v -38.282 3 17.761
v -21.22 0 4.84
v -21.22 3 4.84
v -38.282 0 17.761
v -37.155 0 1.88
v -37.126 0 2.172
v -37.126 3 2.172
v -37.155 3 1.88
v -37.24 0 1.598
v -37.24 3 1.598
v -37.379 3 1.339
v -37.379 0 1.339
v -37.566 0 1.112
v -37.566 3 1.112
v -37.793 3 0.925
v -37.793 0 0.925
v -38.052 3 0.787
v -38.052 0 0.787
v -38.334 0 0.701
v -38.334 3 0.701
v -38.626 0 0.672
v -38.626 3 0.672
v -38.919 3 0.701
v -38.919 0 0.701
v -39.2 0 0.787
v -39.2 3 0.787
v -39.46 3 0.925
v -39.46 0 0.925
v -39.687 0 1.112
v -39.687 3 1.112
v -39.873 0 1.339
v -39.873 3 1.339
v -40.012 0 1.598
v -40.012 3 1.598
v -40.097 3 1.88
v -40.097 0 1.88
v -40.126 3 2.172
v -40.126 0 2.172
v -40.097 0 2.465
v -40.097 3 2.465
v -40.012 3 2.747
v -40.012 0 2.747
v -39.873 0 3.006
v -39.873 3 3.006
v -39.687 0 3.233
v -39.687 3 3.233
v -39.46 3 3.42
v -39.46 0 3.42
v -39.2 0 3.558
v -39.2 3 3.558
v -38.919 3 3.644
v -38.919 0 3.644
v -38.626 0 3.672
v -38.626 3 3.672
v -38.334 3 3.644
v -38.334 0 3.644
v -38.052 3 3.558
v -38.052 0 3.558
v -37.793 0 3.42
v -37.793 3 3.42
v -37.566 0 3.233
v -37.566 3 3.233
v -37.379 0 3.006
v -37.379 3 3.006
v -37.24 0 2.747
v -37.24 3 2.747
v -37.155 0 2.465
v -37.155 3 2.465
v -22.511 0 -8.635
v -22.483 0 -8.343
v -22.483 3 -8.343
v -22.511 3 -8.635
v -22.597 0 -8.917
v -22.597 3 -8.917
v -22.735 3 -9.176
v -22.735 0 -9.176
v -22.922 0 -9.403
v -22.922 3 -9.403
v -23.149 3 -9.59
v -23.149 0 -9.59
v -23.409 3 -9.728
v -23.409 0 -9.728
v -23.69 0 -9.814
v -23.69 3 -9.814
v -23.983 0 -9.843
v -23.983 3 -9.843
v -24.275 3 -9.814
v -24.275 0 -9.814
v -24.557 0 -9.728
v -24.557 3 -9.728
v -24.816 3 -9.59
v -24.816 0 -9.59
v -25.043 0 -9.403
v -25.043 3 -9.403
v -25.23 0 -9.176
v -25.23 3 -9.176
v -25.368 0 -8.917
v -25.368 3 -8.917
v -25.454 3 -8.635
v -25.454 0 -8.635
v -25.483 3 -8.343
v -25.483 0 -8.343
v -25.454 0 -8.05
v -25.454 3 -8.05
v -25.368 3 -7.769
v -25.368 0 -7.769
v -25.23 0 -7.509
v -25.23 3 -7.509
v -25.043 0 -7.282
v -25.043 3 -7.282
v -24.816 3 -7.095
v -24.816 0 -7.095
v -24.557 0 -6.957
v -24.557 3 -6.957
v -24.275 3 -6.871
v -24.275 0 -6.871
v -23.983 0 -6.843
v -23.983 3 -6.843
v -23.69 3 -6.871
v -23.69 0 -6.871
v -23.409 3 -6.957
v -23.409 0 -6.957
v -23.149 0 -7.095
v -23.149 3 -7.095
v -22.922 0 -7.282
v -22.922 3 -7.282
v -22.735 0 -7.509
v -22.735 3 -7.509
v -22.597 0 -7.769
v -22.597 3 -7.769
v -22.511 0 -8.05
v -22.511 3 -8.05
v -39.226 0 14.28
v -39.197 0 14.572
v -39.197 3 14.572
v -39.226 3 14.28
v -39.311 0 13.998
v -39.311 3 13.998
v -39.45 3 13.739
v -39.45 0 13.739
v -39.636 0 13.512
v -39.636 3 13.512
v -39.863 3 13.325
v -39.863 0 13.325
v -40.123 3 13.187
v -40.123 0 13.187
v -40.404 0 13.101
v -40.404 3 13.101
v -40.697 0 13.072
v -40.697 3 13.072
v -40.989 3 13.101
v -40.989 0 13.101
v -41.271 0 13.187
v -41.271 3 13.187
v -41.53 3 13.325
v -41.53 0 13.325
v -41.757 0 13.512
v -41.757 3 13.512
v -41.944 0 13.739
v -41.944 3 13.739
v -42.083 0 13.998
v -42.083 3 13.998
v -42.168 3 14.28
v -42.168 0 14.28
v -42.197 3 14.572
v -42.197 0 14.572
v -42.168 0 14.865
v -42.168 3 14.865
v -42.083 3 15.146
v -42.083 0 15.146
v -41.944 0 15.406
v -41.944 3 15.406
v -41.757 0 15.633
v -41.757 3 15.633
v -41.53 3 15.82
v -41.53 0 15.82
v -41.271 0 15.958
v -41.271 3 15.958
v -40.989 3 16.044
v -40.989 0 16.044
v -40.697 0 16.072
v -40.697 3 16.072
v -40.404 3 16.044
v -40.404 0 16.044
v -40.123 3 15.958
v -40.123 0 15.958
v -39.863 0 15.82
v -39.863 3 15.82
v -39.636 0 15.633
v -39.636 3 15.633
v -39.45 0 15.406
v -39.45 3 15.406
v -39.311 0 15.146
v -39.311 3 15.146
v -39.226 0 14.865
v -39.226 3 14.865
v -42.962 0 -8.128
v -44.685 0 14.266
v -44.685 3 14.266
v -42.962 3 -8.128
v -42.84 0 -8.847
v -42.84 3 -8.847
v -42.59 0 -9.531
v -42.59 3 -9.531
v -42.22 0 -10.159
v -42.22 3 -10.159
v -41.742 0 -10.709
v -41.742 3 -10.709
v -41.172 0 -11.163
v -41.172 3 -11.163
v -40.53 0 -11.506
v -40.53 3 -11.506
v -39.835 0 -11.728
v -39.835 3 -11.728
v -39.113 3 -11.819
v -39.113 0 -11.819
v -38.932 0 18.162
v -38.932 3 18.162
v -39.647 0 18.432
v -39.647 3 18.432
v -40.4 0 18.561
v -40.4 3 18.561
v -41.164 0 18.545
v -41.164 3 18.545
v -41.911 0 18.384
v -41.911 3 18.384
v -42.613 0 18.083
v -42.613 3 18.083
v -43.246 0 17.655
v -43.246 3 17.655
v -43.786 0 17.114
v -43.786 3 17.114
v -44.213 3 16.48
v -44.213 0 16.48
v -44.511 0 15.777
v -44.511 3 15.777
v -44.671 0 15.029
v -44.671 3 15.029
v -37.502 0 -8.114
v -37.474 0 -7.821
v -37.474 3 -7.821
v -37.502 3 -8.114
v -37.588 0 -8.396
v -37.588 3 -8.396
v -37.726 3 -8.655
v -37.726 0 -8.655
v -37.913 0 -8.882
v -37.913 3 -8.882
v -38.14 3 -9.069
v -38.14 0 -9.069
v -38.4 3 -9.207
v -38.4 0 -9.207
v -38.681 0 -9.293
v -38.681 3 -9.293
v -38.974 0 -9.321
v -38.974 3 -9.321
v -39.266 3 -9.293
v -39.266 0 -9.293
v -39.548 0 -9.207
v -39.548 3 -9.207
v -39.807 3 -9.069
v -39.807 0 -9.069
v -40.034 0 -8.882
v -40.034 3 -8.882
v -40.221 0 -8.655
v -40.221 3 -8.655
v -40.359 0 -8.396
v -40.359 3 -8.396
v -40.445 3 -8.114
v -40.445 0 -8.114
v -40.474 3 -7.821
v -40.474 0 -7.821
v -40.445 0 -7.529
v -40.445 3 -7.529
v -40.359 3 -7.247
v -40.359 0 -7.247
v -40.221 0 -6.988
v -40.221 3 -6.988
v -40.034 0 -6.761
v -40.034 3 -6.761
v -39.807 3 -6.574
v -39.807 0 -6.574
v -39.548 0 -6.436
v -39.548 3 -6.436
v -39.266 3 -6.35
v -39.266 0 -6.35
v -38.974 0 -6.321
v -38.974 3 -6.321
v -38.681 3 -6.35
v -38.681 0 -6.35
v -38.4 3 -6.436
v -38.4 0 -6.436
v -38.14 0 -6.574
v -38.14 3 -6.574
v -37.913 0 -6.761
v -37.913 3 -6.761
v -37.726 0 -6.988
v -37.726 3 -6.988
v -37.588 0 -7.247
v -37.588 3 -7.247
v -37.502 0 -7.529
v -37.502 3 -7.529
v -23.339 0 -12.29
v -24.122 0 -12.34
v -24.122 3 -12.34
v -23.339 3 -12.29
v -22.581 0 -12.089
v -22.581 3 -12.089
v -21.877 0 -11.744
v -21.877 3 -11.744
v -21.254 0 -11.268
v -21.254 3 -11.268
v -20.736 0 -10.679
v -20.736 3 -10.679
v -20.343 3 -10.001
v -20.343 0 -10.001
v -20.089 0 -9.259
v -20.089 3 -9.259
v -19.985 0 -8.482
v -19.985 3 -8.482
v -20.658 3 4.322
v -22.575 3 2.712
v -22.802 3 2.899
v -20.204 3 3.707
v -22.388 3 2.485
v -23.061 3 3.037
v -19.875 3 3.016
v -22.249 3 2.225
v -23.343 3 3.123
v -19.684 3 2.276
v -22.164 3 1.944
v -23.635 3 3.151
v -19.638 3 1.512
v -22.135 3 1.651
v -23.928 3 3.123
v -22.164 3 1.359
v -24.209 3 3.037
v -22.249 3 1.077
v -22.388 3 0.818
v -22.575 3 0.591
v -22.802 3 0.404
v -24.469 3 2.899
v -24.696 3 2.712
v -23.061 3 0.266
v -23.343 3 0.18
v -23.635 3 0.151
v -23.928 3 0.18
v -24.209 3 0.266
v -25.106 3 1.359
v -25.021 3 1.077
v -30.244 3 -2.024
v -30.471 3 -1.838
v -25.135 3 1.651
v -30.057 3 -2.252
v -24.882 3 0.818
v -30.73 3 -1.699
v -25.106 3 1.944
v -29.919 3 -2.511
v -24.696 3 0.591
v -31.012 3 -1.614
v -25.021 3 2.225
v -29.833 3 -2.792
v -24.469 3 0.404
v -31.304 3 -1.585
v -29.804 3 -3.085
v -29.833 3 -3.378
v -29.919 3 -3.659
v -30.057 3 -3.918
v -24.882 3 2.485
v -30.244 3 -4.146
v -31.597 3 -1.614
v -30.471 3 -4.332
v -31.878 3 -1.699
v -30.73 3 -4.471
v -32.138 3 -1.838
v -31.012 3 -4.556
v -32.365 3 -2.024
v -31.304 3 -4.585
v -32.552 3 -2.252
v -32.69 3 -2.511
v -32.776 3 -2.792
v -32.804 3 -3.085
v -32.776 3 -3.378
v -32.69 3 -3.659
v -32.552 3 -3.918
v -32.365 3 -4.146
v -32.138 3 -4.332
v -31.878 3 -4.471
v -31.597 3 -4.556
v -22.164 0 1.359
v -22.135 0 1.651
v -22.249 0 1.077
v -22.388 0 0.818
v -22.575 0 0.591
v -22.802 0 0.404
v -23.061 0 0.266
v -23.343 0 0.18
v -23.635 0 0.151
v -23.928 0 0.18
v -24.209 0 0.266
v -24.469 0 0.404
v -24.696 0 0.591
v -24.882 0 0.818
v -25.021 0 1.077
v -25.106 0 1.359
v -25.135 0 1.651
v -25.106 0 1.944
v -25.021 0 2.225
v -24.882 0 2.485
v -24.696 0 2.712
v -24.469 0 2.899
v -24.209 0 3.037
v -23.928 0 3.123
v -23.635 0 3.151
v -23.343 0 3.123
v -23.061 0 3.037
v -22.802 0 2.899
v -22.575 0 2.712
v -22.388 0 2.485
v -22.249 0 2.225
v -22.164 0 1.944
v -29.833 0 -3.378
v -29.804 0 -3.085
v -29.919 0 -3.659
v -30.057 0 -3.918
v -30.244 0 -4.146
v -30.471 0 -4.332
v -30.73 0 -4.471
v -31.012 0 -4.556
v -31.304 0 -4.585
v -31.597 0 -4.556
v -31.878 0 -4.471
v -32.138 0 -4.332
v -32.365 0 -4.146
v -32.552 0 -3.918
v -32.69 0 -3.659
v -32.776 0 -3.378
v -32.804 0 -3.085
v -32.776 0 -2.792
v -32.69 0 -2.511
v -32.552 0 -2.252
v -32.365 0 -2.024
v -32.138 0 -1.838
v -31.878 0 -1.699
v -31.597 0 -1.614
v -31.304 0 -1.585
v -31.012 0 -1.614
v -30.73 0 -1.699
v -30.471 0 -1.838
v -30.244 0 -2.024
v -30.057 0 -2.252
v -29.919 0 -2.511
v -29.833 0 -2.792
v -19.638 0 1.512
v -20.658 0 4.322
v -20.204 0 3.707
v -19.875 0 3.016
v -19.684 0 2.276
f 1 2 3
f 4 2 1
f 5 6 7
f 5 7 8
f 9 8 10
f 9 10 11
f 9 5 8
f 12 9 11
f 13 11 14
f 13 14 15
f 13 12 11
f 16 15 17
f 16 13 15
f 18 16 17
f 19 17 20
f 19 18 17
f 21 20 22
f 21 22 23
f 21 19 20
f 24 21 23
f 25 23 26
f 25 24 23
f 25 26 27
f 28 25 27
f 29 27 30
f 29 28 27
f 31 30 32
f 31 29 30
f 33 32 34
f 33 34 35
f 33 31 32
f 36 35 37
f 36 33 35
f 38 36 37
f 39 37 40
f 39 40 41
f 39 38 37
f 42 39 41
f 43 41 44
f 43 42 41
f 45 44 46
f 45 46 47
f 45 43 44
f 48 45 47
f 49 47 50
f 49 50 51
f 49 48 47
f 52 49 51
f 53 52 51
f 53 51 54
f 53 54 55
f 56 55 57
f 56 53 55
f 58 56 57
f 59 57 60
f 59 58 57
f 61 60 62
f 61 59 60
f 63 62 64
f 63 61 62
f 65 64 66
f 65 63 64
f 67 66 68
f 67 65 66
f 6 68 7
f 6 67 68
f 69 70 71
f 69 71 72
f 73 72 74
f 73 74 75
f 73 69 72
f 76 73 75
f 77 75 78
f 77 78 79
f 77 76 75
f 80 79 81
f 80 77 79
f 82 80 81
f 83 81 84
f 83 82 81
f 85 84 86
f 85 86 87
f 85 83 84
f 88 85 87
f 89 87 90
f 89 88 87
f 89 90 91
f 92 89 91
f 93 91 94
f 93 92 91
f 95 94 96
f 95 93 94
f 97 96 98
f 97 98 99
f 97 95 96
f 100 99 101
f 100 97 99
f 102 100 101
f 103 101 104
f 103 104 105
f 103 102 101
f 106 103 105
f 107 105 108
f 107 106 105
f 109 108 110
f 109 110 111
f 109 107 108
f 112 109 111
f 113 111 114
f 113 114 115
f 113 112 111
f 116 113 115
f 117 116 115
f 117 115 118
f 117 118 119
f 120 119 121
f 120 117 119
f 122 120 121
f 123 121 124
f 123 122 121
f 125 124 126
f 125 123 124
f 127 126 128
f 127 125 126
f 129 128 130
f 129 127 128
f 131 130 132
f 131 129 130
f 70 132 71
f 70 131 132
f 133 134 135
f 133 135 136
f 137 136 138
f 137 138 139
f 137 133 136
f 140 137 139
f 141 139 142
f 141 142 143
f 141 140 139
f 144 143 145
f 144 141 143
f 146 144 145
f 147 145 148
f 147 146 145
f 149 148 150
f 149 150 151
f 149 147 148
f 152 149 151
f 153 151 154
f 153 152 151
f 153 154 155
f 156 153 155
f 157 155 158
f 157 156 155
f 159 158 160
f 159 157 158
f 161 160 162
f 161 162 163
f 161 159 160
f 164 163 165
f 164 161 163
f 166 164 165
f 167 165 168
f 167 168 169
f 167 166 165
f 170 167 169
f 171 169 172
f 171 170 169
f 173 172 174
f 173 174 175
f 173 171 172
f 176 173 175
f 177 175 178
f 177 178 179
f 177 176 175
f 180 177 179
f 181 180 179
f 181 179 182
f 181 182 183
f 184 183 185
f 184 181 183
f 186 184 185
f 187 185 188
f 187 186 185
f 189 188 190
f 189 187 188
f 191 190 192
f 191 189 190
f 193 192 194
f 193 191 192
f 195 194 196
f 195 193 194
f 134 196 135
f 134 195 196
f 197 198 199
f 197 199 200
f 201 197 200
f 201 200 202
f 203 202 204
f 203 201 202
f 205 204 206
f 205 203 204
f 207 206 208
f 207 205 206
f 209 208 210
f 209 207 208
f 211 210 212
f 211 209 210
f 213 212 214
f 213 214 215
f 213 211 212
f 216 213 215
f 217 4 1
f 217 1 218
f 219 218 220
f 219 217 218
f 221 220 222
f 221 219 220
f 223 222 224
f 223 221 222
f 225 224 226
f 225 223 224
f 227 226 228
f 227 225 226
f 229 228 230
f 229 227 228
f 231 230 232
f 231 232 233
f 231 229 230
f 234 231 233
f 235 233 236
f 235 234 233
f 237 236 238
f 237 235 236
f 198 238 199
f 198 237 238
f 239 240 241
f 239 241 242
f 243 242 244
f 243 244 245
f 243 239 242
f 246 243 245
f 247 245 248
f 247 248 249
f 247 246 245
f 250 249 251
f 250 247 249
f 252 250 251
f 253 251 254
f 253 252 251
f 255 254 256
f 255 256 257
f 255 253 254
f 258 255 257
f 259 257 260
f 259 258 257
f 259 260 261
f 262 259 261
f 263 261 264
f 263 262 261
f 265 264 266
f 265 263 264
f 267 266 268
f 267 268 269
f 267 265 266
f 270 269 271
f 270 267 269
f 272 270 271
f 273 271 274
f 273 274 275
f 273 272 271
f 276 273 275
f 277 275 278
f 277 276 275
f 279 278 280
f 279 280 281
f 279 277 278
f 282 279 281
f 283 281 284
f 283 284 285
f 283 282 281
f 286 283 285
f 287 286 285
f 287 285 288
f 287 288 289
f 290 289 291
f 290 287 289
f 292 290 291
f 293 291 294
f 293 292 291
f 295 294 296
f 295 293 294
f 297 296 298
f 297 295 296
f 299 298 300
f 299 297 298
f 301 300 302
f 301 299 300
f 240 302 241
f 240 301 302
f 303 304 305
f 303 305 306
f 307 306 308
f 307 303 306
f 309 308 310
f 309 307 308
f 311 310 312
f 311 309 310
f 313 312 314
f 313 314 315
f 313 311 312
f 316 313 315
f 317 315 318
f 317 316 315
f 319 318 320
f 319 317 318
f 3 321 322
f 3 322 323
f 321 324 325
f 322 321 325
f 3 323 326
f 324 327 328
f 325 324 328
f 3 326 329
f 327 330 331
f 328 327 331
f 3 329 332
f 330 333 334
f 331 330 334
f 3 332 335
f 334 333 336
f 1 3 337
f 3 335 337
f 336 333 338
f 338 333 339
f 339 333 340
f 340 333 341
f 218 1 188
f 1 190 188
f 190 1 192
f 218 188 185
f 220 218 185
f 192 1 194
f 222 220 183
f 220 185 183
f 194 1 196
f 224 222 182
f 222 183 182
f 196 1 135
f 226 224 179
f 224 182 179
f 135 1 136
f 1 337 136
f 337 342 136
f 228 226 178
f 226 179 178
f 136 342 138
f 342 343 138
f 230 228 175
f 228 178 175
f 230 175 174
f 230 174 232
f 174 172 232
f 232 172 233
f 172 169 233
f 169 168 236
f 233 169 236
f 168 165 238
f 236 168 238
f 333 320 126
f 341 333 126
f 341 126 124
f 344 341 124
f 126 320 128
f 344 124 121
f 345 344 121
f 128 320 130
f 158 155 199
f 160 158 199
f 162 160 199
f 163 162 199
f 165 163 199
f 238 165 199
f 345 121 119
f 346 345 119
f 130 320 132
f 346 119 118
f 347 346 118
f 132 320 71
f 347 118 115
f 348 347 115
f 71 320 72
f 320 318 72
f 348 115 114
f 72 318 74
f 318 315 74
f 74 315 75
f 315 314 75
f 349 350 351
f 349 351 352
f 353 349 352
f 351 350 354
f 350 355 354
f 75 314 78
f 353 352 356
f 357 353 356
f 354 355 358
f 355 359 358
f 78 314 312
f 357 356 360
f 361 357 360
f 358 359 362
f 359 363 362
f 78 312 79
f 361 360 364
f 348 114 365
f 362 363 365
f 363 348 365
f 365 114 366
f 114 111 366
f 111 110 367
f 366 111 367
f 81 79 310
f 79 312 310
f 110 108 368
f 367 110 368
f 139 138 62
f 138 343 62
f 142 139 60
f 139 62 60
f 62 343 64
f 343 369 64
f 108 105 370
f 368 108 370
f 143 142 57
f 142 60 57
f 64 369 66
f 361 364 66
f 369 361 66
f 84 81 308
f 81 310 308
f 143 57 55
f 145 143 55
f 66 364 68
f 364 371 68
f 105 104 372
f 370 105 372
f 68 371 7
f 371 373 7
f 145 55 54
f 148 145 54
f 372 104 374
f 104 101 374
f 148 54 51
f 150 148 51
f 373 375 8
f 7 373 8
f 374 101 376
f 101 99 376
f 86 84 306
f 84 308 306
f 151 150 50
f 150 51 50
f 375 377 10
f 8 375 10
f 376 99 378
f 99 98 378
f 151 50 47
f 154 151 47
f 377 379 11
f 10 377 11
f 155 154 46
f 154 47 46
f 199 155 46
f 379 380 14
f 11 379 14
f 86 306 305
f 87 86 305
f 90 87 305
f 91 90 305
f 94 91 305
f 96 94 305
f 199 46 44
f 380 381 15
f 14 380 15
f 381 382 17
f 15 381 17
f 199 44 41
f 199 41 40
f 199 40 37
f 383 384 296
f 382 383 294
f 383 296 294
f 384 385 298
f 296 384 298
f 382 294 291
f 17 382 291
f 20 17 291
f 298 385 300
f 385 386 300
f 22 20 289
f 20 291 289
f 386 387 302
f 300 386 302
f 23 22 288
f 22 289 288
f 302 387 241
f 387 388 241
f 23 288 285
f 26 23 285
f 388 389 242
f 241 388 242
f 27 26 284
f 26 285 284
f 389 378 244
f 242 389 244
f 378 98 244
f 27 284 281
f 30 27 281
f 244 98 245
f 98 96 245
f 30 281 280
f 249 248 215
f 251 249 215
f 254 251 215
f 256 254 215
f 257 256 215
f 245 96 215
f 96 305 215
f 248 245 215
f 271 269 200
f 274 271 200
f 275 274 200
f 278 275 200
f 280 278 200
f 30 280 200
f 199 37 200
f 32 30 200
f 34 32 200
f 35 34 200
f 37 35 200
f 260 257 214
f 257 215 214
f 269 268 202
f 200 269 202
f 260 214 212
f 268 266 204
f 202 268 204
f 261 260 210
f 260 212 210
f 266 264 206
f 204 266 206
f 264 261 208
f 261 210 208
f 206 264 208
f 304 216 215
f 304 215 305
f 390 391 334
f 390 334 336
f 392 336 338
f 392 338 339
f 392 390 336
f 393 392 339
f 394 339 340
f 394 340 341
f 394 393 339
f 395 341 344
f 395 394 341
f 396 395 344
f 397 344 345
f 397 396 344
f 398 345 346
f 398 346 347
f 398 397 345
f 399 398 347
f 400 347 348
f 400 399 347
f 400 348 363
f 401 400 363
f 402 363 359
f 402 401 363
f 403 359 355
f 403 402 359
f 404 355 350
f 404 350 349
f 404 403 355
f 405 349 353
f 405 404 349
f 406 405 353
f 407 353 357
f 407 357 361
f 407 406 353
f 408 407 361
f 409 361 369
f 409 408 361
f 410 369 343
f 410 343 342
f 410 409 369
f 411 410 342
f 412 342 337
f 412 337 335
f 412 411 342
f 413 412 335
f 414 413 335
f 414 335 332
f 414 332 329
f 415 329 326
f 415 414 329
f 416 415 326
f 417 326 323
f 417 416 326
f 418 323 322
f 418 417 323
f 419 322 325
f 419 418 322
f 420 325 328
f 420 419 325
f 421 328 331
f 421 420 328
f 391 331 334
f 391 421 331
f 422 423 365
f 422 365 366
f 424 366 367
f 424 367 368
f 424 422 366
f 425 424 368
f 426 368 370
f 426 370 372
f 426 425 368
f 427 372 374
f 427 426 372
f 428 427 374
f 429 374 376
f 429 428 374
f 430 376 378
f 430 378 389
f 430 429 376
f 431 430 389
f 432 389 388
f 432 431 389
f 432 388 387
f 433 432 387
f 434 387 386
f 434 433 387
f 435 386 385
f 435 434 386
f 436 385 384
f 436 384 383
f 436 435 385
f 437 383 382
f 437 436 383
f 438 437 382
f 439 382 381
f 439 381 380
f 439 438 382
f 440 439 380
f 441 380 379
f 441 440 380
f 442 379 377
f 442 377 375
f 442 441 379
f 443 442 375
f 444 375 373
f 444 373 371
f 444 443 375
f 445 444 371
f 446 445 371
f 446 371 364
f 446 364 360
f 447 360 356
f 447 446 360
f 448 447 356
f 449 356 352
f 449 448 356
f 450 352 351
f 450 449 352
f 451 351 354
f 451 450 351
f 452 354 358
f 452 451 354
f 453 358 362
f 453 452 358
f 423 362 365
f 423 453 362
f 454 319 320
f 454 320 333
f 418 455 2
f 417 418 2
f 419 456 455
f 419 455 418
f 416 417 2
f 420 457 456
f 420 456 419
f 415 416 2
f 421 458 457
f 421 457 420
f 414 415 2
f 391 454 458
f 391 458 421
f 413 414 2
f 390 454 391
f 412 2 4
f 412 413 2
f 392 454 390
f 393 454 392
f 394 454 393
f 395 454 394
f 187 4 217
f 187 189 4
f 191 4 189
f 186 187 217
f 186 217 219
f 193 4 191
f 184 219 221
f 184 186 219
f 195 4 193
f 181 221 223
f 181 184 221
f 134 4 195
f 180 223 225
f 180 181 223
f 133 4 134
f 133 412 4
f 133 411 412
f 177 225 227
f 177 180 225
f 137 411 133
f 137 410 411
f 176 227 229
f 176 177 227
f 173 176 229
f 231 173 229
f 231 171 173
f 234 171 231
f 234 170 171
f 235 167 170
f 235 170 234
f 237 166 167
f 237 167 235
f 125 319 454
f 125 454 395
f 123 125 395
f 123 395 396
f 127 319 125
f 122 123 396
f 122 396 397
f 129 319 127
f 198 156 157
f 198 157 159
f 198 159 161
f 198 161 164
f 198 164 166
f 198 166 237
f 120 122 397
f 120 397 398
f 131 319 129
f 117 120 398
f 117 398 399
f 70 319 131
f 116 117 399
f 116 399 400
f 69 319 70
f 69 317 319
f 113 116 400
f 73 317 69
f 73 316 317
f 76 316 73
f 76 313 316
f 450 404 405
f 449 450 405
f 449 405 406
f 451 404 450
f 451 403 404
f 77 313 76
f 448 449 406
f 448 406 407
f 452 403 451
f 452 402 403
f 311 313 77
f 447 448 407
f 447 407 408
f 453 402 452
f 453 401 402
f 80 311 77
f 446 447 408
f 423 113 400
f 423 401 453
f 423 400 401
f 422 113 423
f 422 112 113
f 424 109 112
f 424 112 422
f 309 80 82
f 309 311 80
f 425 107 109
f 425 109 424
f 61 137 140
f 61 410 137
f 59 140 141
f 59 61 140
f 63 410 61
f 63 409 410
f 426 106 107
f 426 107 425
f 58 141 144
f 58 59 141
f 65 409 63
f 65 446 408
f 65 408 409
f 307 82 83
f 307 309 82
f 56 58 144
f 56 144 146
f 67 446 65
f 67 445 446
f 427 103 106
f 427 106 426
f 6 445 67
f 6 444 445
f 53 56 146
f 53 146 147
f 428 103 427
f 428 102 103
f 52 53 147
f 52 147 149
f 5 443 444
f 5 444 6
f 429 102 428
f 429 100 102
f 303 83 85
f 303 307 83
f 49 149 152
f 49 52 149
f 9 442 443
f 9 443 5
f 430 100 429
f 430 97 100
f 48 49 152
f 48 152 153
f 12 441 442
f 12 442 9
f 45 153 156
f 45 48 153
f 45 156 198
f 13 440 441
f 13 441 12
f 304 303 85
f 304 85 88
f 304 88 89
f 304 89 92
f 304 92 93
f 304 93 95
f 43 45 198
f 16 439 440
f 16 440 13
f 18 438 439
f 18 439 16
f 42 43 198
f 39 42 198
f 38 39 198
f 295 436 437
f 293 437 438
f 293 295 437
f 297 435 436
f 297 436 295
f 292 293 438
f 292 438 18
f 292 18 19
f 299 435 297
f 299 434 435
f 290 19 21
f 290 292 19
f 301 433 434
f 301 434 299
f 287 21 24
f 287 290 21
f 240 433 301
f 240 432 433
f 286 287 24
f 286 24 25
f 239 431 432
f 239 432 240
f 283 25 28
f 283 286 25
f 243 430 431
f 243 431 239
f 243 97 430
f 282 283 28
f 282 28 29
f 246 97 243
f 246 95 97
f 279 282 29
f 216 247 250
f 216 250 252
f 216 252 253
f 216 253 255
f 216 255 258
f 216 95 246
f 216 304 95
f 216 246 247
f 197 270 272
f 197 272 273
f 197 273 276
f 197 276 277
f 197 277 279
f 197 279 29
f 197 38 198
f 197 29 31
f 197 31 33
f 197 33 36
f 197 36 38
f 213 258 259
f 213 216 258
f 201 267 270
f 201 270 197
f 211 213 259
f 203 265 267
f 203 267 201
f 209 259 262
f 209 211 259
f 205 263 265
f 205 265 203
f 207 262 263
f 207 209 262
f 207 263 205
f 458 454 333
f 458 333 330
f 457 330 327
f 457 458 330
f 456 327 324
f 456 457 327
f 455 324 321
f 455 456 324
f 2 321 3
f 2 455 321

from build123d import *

# Parameters (mm, degrees)
SKETCH1_R           = 1.5
BOSS_EXTRUDE1_DEPTH = 3


with BuildPart() as part:
    # Sketch1 → Boss-Extrude1 (new body)
    with BuildSketch(Plane(origin=(0, 0, 0), x_dir=(1, 0, 0), z_dir=(0, 1, 0))):
        with BuildLine():
            Line((-21.220362367, -4.8401676), (-38.281803408, -17.761164033))
            ThreePointArc((-38.281803408, -17.761164033), (-42.613403289, -18.083291405), (-44.684930136, -14.265530269))
            Line((-44.684930136, -14.265530269), (-42.961821092, 8.128352288))
            ThreePointArc((-42.961821092, 8.128352288), (-41.741950615, 10.708740743), (-39.11256419, 11.819063031))
            Line((-39.11256419, 11.819063031), (-24.121617673, 12.340141252))
            ThreePointArc((-24.121617673, 12.340141252), (-21.254198948, 11.26753095), (-19.985077742, 8.481509707))
            Line((-19.985077742, 8.481509707), (-19.637692261, -1.512454638))
            ThreePointArc((-19.637692261, -1.512454638), (-20.023012527, -3.36941295), (-21.220362367, -4.8401676))
        make_face()
        with Locations((-23.635277999, -1.65140883)):
            Circle(SKETCH1_R, mode=Mode.SUBTRACT)
        with Locations((-31.304443998, 3.085034231)):
            Circle(SKETCH1_R, mode=Mode.SUBTRACT)
        with Locations((-23.98266348, 8.342555514)):
            Circle(SKETCH1_R, mode=Mode.SUBTRACT)
        with Locations((-38.973609998, 7.821477293)):
            Circle(SKETCH1_R, mode=Mode.SUBTRACT)
        with Locations((-38.626224517, -2.172487052)):
            Circle(SKETCH1_R, mode=Mode.SUBTRACT)
        with Locations((-40.696719041, -14.572405264)):
            Circle(SKETCH1_R, mode=Mode.SUBTRACT)
    extrude(amount=BOSS_EXTRUDE1_DEPTH)


solid = part.part
